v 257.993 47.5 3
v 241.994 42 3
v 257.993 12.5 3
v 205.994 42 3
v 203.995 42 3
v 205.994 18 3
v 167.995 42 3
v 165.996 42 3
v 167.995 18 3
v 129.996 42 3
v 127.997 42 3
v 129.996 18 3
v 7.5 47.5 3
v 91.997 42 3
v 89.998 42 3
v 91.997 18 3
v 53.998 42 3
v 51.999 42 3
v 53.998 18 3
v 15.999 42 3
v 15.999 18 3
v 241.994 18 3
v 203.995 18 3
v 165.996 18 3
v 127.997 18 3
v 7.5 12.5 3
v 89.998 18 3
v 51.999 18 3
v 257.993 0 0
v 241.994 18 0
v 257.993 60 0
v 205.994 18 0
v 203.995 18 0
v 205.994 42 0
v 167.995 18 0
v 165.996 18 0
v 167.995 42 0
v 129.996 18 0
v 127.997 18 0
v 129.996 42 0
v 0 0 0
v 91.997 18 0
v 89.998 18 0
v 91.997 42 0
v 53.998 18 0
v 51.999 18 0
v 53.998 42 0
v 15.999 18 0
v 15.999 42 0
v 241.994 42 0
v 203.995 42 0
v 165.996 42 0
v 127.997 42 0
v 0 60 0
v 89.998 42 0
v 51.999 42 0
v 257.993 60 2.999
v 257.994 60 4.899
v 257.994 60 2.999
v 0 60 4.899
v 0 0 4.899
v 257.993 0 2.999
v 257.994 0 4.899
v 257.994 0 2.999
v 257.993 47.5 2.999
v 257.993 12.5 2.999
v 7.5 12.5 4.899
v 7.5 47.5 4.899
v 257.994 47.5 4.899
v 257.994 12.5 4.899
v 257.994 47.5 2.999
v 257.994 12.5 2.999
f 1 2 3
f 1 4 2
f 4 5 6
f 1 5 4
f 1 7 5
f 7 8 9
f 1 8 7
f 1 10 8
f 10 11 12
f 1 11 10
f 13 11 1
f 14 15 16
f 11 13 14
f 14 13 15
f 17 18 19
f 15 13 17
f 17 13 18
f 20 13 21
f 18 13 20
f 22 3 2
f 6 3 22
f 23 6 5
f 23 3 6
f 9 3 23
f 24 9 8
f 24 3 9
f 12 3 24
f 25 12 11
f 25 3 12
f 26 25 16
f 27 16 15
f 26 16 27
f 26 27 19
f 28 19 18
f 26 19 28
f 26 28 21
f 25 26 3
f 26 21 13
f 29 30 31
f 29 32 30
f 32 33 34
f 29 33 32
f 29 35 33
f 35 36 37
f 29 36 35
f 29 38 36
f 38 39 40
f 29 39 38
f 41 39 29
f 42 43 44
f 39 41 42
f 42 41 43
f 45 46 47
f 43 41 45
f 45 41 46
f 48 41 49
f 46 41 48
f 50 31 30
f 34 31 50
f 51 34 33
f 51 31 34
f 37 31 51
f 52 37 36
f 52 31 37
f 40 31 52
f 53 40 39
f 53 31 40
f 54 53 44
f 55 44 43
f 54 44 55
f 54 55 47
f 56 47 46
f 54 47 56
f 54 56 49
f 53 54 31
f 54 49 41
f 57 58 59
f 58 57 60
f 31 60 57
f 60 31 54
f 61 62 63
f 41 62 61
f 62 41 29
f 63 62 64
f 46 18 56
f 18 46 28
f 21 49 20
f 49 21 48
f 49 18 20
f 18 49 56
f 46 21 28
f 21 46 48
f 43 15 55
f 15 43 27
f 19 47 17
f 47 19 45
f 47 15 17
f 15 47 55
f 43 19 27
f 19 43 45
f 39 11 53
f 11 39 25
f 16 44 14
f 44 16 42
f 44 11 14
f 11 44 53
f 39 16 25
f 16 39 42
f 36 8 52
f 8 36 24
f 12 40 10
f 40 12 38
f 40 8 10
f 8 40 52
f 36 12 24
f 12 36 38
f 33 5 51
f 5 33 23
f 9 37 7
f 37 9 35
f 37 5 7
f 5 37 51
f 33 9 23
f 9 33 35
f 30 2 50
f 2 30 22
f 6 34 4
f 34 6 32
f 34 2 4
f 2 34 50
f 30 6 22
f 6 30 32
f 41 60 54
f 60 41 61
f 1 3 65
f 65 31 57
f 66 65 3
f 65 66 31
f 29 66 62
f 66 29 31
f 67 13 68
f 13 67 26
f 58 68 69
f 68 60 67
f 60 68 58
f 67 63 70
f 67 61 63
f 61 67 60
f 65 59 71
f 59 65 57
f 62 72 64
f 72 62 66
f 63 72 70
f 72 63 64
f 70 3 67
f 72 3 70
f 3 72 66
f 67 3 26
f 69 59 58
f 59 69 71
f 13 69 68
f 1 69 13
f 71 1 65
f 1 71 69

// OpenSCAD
//film holder for 35mm film used with anti-Newton glass

//film height
film_height = 35; //35mm film - (34.976 ± 0.025 mm - so max is 35.001) 

//width of frame
fw=36;

//height of frame
fh=24;

//width of post between frames
p=2;//nikon f100 creates spacing of 2mm

//width of margin near top and bottom of the frame
mh=18;

//height of holder base
h1=3;

//height of 'lips' that hold anti-Newton glass
h2=1.9; //my glass has height 2mm, I want holder to rest on glass, not on plastic, because glass is smoother

//gap between copies so openscad understands they form one piece
g=0.001;

//number of frames
n = 6;

//width of left and right borders
mw = 15;

//anti-Newton glass height
//angh = 32.8; //real is 33 (ordered 34!)
angh = film_height; //otherwise film won't fit!
//we need glass 270x35

assert(angh >= film_height, "Film won't fit into glass channel");


total_base_height = fh+2*mh;
full_frame_width=fw+p-g;
full_base_width=full_frame_width*n+2*mw;

echo("width=", full_base_width);

module frame() {
    difference() {
        cube([fw+p,total_base_height, h1], center=true);
        cube([fw, fh, h1+g*2], center=true);
    }
}

module base_main() {
    for (i=[0:1:n-1]) {
        translate([full_frame_width*i,0,0]) 
            frame();
    }
}

module base_side() {
    cube([mw,total_base_height,h1], center=true);
}

module base() {
    //main base
    translate([mw+0.5*(fw+p)-g,0,0]) base_main();
    //left margin
    translate([mw/2,0,0]) base_side();
    //right margin
    translate([1.5*mw+full_frame_width*n-g,0,0]) base_side();
}

module lip(lip_height) {
    cube([full_base_width, lip_height,h2]);
}

module lips() {
    //stopper so that glass doesn't move
    cube([mw/2,total_base_height,h2]);
    //lips
    lip_height = (total_base_height-angh)/2;
    lip(lip_height);
    translate([0,angh+lip_height,0]) lip(lip_height);
}

translate([0,total_base_height/2,h1/2]) base();
translate([0,0,h1-g]) lips();
